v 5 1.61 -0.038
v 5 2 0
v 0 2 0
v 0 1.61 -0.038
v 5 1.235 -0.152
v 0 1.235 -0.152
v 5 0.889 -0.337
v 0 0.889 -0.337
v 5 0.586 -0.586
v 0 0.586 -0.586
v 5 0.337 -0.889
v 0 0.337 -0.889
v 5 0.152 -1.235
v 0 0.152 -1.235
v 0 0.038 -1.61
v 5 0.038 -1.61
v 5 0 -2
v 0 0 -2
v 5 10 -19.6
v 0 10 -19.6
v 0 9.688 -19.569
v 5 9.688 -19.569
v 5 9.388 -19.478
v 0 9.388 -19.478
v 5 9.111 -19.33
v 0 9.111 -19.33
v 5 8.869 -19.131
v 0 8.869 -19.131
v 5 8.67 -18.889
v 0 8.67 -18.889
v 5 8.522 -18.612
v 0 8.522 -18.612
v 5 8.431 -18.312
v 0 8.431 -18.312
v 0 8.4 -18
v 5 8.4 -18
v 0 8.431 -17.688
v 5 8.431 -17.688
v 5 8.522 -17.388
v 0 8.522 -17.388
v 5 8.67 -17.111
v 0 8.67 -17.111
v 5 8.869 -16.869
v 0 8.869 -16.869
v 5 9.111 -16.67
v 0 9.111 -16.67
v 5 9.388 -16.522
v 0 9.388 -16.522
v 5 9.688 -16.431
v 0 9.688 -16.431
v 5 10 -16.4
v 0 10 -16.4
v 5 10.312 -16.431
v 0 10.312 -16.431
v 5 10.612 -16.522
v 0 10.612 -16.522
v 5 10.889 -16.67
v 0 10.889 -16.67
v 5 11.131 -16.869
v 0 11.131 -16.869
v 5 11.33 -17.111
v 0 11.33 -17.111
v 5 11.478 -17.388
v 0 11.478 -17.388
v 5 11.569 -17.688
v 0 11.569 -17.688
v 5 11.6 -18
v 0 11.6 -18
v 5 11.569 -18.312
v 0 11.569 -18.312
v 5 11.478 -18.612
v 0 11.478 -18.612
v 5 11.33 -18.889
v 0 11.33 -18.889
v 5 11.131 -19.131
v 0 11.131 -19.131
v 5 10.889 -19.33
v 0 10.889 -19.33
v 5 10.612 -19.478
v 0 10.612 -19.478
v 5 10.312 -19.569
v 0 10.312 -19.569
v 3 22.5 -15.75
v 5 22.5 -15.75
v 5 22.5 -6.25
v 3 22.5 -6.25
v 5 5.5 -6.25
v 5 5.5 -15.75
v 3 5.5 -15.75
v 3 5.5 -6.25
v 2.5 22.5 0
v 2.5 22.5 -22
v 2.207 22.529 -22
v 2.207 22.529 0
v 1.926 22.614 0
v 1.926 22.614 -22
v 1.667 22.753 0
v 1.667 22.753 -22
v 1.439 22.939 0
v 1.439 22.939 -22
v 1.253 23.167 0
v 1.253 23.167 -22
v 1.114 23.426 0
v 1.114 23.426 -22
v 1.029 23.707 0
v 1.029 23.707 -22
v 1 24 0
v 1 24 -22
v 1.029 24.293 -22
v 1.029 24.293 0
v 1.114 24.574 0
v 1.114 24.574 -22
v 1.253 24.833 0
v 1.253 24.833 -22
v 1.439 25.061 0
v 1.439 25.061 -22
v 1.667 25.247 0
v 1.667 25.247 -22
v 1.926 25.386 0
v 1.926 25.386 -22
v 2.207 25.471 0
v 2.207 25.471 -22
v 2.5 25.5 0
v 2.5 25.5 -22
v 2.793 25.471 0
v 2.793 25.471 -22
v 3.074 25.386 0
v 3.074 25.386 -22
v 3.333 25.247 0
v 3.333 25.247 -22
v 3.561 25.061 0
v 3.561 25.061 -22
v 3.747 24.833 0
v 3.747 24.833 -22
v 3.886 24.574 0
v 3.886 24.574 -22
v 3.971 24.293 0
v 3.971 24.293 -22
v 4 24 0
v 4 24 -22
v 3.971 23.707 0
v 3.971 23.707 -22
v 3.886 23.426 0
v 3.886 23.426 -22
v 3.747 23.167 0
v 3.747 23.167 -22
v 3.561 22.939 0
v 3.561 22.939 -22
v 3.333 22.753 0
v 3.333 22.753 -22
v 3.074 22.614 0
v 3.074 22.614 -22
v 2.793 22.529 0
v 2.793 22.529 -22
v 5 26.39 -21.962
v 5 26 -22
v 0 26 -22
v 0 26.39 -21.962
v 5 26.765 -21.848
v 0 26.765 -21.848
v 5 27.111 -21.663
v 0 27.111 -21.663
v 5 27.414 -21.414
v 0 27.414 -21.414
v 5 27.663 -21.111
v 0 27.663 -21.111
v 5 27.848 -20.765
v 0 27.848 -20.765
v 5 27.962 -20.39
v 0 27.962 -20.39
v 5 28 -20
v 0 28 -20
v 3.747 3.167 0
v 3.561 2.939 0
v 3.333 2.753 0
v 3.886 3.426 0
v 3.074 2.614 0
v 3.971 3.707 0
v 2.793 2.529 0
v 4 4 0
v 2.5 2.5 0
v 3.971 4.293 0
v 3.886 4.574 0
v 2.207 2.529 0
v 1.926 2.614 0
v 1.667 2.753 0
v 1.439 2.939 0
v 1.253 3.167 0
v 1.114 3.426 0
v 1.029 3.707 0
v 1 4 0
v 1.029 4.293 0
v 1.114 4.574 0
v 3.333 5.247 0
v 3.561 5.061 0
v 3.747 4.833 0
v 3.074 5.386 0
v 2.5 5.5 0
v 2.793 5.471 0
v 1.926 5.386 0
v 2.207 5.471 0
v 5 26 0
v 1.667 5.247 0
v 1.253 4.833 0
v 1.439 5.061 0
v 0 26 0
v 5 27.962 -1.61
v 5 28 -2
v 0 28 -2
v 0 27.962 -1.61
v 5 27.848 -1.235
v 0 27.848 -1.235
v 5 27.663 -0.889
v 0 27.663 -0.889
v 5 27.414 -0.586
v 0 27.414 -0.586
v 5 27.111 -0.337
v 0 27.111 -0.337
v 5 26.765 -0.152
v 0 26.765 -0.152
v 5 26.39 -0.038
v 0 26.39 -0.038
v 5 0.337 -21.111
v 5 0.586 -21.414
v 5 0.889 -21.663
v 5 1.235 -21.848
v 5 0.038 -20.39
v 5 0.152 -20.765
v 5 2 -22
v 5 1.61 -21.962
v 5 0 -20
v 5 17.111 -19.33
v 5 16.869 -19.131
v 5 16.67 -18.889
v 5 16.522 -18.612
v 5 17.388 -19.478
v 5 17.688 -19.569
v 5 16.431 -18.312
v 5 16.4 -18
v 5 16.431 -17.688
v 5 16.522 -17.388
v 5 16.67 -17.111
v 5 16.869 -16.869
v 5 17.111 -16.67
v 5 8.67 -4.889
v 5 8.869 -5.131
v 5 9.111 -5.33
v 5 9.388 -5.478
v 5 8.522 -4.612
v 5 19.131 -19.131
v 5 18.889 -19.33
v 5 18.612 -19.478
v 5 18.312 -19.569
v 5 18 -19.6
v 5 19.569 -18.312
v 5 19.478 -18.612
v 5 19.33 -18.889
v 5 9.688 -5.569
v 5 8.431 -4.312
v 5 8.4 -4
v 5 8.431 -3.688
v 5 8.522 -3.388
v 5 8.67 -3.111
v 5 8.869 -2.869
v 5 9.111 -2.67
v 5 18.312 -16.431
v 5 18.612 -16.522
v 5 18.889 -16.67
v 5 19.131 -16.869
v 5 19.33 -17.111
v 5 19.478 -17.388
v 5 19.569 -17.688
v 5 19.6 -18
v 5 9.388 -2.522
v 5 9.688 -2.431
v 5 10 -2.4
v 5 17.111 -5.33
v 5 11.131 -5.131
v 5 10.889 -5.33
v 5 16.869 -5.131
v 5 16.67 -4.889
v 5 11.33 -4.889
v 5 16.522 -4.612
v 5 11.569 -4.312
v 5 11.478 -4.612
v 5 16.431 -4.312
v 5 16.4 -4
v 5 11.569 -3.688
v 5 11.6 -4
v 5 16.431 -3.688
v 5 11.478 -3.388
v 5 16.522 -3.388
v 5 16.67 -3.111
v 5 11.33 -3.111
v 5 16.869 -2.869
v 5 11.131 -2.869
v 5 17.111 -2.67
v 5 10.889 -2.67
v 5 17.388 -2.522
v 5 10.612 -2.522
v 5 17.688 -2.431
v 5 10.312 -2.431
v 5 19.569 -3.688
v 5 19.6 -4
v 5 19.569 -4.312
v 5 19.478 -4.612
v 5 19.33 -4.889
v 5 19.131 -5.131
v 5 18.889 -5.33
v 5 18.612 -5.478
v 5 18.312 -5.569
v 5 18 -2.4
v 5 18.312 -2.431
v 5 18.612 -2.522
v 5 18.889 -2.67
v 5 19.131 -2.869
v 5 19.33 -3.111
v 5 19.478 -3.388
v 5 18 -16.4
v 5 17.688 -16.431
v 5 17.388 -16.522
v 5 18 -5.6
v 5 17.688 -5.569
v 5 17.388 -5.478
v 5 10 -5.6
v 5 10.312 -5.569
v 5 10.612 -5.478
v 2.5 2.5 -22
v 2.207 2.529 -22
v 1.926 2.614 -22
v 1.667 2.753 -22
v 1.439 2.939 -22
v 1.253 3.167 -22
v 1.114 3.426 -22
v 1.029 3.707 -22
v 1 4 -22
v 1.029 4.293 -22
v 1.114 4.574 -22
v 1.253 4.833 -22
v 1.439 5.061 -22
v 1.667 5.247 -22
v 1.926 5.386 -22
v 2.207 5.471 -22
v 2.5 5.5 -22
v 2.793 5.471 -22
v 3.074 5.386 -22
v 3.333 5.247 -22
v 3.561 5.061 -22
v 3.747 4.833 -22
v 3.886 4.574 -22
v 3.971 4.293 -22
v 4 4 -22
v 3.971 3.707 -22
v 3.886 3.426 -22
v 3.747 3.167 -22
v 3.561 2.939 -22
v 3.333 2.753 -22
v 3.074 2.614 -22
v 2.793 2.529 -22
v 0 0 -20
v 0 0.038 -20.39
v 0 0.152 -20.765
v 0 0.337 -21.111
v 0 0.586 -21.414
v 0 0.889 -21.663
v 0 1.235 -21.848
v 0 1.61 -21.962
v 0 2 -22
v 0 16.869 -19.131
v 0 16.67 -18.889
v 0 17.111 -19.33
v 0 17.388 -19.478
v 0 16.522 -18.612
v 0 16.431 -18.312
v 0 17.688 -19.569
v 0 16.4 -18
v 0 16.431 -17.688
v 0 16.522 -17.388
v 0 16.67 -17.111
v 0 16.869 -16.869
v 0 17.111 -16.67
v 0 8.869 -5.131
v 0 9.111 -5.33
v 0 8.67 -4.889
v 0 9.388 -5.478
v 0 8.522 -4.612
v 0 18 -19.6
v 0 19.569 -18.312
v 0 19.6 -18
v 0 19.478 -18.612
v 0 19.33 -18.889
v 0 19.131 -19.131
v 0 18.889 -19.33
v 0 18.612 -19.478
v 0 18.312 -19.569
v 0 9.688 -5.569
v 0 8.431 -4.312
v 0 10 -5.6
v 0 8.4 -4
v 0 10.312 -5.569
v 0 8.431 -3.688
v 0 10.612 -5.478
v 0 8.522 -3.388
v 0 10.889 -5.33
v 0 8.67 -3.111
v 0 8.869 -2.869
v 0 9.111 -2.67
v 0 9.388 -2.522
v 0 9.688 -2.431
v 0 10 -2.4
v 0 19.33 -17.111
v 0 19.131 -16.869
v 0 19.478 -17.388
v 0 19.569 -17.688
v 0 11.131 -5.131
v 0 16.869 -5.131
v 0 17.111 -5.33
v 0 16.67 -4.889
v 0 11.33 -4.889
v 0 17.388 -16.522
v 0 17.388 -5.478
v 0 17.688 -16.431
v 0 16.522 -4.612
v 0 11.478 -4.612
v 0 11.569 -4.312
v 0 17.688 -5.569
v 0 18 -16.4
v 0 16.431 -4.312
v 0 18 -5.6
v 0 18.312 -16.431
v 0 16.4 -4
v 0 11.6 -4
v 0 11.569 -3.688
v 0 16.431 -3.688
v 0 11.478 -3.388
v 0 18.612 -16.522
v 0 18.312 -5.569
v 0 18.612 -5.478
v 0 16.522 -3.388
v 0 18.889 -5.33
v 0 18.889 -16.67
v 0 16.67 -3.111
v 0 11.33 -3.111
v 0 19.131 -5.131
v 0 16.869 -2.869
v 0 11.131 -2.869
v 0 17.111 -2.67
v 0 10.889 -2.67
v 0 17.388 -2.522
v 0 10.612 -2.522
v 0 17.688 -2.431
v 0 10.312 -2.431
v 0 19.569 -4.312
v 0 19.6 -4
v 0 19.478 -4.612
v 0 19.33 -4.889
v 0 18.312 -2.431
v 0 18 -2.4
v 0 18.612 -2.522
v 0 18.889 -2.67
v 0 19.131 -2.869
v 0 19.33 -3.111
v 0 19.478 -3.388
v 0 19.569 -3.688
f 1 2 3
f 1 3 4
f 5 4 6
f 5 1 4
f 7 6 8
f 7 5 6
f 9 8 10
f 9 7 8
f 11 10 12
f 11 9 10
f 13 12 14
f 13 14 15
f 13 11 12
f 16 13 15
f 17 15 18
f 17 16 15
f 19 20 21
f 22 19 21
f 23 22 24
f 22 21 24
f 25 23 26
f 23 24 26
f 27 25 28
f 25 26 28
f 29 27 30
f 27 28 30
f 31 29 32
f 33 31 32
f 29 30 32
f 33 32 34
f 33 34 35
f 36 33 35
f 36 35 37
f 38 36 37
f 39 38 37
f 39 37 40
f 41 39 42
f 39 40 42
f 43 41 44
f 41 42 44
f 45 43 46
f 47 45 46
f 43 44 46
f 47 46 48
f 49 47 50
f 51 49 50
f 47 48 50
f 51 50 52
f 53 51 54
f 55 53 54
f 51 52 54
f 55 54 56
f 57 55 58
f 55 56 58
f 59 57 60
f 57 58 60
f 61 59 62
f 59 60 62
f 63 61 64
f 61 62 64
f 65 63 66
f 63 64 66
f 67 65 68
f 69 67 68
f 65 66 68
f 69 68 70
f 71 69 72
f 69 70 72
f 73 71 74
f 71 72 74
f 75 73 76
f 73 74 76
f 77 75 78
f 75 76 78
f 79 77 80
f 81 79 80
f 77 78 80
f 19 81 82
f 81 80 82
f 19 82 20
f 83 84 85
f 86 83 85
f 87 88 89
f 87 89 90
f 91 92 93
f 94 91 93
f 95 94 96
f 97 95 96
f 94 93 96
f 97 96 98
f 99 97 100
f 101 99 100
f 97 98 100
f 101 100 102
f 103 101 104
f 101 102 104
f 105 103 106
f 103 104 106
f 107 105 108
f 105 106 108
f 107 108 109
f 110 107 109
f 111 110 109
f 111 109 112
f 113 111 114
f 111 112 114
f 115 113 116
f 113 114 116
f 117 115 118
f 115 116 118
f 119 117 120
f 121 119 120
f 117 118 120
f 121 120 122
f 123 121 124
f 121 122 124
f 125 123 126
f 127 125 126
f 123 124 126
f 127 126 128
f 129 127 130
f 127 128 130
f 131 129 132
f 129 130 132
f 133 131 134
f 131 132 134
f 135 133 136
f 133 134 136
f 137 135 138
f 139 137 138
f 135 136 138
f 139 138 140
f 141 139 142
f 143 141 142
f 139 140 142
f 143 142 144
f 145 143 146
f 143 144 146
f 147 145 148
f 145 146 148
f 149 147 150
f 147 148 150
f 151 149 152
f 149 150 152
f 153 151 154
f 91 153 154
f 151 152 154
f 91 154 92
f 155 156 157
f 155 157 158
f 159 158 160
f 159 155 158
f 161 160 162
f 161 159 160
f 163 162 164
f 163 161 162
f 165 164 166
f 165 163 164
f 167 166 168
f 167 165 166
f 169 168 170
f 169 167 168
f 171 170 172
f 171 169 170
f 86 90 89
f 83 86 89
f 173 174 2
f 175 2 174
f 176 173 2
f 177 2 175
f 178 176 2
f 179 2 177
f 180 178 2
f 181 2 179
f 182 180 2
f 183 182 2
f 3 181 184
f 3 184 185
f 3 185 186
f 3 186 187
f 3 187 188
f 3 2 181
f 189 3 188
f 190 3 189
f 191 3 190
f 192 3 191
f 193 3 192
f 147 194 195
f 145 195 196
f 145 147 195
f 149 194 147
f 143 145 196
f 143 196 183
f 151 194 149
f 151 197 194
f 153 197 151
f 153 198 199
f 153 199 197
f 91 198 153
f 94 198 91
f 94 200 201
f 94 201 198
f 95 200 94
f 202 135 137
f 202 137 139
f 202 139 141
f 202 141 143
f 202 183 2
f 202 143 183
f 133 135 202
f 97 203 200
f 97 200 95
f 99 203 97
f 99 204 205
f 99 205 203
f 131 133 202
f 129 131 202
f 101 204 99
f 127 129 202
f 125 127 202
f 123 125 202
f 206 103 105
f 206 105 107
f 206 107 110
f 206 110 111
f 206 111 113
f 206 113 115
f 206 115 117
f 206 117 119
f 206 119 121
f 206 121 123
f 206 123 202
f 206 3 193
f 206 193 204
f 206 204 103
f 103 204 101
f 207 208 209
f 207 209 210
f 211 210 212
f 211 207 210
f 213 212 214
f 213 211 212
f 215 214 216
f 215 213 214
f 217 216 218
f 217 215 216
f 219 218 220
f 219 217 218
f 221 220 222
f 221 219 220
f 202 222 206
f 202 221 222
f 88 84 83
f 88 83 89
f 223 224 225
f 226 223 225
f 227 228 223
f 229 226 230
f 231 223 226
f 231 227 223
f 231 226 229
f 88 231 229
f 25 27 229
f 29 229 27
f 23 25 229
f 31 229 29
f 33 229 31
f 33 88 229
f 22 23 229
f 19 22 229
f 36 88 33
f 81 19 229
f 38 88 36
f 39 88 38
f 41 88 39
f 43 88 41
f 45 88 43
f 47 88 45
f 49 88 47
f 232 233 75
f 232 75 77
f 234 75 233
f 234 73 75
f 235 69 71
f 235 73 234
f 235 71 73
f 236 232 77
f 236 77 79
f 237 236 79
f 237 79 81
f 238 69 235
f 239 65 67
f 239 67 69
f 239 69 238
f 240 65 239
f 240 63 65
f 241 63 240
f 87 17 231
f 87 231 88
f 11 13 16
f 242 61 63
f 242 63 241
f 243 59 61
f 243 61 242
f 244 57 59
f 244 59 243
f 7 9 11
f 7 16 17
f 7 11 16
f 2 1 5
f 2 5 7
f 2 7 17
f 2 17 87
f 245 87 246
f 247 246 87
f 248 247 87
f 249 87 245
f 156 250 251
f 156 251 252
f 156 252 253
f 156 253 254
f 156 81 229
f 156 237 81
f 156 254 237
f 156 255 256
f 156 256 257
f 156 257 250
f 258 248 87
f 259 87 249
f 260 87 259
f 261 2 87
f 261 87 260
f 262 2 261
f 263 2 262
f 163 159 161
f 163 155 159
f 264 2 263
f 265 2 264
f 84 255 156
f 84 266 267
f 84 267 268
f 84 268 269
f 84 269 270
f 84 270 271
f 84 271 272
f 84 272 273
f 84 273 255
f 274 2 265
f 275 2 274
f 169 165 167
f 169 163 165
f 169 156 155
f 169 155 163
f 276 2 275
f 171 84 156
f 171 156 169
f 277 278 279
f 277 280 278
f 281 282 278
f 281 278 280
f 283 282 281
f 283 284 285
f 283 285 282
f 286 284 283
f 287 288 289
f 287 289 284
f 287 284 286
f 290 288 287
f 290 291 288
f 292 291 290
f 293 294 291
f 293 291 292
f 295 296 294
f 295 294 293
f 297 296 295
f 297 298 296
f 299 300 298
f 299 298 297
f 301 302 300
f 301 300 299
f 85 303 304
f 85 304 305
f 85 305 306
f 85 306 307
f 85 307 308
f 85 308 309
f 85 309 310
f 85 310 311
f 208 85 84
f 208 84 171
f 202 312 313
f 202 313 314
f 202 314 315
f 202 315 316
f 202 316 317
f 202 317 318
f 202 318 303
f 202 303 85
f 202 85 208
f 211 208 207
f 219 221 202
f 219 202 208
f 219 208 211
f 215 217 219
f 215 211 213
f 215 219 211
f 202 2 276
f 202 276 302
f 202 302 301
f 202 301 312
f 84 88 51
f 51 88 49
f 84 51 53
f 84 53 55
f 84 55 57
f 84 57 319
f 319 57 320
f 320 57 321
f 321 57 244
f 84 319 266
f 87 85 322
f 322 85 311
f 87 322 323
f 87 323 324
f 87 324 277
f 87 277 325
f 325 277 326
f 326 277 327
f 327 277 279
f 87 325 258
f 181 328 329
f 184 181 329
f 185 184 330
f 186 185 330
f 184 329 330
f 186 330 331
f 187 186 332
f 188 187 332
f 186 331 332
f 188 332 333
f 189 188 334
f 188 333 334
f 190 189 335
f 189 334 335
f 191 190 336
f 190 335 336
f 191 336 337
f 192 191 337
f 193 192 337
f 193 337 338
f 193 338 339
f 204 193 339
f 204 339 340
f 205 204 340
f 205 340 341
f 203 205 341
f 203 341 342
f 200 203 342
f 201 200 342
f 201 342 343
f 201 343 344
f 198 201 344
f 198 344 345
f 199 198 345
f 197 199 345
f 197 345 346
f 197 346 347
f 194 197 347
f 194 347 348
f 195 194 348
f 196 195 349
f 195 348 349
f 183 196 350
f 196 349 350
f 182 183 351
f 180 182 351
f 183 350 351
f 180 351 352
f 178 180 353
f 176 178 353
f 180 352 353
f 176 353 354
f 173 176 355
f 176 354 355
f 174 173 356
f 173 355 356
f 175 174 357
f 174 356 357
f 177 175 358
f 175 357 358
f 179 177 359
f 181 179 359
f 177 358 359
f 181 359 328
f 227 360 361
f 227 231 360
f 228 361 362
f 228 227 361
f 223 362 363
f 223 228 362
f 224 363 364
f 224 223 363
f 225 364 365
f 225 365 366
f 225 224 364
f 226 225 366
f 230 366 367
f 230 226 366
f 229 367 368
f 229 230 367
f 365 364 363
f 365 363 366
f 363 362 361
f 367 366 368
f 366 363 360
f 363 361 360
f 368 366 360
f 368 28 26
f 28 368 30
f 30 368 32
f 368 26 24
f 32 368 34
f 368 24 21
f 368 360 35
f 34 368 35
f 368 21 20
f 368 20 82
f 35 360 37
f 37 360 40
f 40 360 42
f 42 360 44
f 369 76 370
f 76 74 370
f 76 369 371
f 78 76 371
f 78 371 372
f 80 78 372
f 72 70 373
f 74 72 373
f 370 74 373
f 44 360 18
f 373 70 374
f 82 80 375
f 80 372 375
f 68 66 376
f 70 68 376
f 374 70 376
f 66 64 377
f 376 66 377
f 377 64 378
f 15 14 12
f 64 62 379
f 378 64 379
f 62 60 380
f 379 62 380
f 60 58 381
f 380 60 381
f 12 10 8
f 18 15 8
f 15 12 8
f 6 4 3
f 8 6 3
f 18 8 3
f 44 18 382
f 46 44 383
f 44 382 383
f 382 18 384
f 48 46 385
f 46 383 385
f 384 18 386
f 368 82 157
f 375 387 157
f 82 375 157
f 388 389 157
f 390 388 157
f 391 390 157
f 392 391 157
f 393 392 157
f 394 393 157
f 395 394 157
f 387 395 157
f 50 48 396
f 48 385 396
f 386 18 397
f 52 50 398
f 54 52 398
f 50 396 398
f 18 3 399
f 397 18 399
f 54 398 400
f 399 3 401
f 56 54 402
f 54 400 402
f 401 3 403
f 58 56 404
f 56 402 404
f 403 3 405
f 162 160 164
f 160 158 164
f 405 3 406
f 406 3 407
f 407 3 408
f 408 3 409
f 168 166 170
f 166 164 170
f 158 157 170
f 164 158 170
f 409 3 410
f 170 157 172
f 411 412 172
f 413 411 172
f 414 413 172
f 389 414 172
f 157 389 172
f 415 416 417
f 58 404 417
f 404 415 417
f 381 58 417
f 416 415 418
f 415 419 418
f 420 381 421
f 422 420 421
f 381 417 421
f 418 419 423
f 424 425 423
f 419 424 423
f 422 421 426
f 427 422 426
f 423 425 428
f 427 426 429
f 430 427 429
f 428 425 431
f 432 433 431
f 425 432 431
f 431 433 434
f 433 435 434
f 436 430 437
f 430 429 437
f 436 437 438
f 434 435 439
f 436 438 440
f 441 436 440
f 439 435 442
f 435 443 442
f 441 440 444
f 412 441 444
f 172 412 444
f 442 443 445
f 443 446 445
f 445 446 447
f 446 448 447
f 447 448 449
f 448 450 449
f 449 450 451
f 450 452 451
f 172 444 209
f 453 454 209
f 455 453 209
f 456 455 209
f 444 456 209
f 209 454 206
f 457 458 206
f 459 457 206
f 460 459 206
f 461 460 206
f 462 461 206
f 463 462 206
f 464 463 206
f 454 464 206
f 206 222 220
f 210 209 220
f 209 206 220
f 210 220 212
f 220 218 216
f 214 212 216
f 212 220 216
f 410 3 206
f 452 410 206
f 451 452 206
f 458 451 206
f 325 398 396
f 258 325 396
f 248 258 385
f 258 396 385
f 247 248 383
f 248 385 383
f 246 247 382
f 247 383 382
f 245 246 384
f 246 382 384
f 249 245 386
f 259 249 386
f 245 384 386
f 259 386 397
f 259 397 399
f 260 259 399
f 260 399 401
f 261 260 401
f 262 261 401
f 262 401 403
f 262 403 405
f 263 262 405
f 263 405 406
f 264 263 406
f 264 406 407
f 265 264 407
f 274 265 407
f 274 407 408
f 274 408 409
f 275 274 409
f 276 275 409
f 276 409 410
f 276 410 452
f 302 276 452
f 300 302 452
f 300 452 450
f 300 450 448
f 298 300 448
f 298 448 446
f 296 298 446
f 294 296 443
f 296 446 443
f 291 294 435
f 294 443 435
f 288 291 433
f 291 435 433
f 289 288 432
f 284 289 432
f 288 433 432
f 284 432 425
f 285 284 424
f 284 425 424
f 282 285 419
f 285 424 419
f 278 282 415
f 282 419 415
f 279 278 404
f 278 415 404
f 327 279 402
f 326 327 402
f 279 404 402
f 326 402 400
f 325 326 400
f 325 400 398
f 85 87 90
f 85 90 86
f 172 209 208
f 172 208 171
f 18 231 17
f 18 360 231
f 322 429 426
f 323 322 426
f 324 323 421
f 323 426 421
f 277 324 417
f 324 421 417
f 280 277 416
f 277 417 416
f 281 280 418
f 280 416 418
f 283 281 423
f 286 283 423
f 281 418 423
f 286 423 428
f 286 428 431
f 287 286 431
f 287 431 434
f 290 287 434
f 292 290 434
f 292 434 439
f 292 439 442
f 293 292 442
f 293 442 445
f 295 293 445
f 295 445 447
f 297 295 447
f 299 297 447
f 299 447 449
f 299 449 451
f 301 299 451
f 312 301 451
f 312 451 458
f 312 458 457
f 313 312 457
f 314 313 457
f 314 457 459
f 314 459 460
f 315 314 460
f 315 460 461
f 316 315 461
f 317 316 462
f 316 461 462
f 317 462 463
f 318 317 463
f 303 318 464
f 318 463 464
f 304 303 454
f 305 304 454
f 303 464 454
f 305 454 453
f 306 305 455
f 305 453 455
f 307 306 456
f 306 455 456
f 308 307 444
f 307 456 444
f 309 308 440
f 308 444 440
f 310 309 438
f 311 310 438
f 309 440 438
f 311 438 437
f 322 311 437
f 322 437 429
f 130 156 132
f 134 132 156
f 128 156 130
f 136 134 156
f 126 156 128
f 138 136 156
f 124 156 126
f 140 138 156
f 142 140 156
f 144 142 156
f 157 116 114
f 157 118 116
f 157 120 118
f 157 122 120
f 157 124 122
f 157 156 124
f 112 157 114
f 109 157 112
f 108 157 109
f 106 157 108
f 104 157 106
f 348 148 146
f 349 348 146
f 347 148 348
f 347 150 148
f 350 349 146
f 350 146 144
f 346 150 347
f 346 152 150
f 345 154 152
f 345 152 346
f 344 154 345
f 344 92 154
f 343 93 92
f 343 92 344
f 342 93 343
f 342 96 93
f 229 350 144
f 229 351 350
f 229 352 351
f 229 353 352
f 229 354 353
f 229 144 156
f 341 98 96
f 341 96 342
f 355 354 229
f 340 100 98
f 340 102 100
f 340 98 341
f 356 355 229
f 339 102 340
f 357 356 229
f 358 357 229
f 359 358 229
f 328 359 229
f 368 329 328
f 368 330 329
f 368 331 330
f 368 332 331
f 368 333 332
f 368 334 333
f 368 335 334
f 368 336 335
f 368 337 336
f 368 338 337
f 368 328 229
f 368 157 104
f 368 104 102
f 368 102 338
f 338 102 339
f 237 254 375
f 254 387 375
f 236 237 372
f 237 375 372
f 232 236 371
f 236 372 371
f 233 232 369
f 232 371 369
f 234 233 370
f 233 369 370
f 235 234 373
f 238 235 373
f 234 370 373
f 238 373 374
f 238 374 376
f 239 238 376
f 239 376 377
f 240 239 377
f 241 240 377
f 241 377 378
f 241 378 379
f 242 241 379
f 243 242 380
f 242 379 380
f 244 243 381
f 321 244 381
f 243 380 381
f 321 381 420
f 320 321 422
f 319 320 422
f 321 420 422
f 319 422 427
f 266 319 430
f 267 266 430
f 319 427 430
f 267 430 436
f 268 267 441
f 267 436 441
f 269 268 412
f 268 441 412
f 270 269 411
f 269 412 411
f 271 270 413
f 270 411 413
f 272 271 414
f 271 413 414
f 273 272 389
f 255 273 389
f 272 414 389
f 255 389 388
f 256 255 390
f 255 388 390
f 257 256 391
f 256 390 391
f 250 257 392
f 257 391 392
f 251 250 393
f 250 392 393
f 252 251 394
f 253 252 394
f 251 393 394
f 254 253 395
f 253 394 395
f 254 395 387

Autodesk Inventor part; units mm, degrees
ref_plane "YZ Plane" through (0, 0, 0) normal (1, 0, 0) x (0, 1, 0)
ref_plane "XZ Plane" through (0, 0, 0) normal (0, 1, 0) x (-1, 0, 0)
ref_plane "XY Plane" through (0, 0, 0) normal (0, 0, 1) x (1, 0, 0)
sketch "Sketch1" plane through (0, 0, 0) normal (1, 0, 0) x (0, 1, 0)
  line L0 (0, 0) -> (28, 0)
  line L1 (28, 0) -> (28, -22)
  line L2 (28, -22) -> (0, -22)
  line L3 (0, -22) -> (0, 0)
  dimension "d0" = 28
  dimension "d1" = 22
extrude "Extrusion1" add sketch "Sketch1" along normal blind 5
sketch "Sketch2" plane through (0, 0, 0) normal (0, 0, 1) x (1, 0, 0)
  line L0 (0, 28) -> (5, 28) projected
  line L1 (0, 0) -> (5, 0) projected
  point P0 (2.5, 4)
  point P1 (2.5, 24)
  dimension "d4" = 4
  dimension "d5" = 4
hole "Hole1" at (2.5, 4, 0) at (2.5, 24, 0) direction (0, 0, -1) diameter 3 depth 80.45
sketch "Sketch3" plane through (5, 0, 0) normal (1, 0, 0) x (0, 0, -1)
  line L0 (22, 28) -> (0, 28) projected
  line L1 (0, 0) -> (22, 0) projected
  line L2 (0, 28) -> (0, 0) projected
  line L3 (11, 28) -> (11, 0)
  point P0 (4, 18)
  point P1 (4, 10)
  point P2 (18, 18)
  point P3 (18, 10)
  dimension "d13" = 10
  dimension "d14" = 10
  dimension "d15" = 4
  dimension "d16" = 4
hole "Hole2" at (5, 18, -4) at (5, 10, -4) at (5, 18, -18) at (5, 10, -18) direction (-1, 0, 0) diameter 3.2 depth 80.45
fillet "Fillet1" radius 2 4 edges at (2.5, 28, 0) (2.5, 28, -22) (2.5, 0, -22) (2.5, 0, 0)
sketch "Sketch4" plane through (5, 0, 0) normal (1, 0, 0) x (0, 0, -1)
  circle A0 centre (4, 18) radius 1.6 projected
  circle A1 centre (18, 10) radius 1.6 projected
  line L0 (4, 18) -> (18, 18)
  line L1 (18, 18) -> (18, 10)
  line L2 (18, 10) -> (4, 10)
  line L3 (4, 10) -> (4, 18)
  line L4 (22, 22.5) -> (0, 22.5) projected
  line L5 (15.75, 5.5) -> (6.25, 5.5)
  line L6 (6.25, 5.5) -> (6.25, 22.5)
  line L7 (6.25, 22.5) -> (15.75, 22.5)
  line L8 (15.75, 22.5) -> (15.75, 5.5)
  line L9 (15.75, 5.5) -> (6.25, 22.5) construction
  line L10 (6.25, 5.5) -> (15.75, 22.5) construction
  line L11 (6.25, 22.5) -> (15.75, 22.5)
  line L12 (15.75, 22.5) -> (15.75, 29.5007)
  line L13 (15.75, 29.5007) -> (6.25, 29.5007)
  line L14 (6.25, 29.5007) -> (6.25, 22.5)
  line L15 (6.25, 5.5) -> (15.75, 5.5)
  line L16 (15.75, 5.5) -> (15.75, -2.0044)
  line L17 (15.75, -2.0044) -> (6.25, -2.0044)
  line L18 (6.25, -2.0044) -> (6.25, 5.5)
  point P0 (0, 0)
  point P1 (11, 14)
  dimension "d25" = 9.5
extrude "Extrusion2" cut sketch "Sketch4" against normal blind 2 contours L6 L4 L8 L0 | L0 L8 L2 L6 | L2 L8 L5 L6
sketch "Sketch5" plane through (0, 2, -22) normal (0, 0, -1) x (-1, 0, 0)
  circle A0 centre (-2.5, 2) radius 1.5 projected
  circle A1 centre (-2.5, 22) radius 1.5 projected
  point P0 (0, -2)
properties part number "belt_holder_1" material "アルミニウム 6061"
